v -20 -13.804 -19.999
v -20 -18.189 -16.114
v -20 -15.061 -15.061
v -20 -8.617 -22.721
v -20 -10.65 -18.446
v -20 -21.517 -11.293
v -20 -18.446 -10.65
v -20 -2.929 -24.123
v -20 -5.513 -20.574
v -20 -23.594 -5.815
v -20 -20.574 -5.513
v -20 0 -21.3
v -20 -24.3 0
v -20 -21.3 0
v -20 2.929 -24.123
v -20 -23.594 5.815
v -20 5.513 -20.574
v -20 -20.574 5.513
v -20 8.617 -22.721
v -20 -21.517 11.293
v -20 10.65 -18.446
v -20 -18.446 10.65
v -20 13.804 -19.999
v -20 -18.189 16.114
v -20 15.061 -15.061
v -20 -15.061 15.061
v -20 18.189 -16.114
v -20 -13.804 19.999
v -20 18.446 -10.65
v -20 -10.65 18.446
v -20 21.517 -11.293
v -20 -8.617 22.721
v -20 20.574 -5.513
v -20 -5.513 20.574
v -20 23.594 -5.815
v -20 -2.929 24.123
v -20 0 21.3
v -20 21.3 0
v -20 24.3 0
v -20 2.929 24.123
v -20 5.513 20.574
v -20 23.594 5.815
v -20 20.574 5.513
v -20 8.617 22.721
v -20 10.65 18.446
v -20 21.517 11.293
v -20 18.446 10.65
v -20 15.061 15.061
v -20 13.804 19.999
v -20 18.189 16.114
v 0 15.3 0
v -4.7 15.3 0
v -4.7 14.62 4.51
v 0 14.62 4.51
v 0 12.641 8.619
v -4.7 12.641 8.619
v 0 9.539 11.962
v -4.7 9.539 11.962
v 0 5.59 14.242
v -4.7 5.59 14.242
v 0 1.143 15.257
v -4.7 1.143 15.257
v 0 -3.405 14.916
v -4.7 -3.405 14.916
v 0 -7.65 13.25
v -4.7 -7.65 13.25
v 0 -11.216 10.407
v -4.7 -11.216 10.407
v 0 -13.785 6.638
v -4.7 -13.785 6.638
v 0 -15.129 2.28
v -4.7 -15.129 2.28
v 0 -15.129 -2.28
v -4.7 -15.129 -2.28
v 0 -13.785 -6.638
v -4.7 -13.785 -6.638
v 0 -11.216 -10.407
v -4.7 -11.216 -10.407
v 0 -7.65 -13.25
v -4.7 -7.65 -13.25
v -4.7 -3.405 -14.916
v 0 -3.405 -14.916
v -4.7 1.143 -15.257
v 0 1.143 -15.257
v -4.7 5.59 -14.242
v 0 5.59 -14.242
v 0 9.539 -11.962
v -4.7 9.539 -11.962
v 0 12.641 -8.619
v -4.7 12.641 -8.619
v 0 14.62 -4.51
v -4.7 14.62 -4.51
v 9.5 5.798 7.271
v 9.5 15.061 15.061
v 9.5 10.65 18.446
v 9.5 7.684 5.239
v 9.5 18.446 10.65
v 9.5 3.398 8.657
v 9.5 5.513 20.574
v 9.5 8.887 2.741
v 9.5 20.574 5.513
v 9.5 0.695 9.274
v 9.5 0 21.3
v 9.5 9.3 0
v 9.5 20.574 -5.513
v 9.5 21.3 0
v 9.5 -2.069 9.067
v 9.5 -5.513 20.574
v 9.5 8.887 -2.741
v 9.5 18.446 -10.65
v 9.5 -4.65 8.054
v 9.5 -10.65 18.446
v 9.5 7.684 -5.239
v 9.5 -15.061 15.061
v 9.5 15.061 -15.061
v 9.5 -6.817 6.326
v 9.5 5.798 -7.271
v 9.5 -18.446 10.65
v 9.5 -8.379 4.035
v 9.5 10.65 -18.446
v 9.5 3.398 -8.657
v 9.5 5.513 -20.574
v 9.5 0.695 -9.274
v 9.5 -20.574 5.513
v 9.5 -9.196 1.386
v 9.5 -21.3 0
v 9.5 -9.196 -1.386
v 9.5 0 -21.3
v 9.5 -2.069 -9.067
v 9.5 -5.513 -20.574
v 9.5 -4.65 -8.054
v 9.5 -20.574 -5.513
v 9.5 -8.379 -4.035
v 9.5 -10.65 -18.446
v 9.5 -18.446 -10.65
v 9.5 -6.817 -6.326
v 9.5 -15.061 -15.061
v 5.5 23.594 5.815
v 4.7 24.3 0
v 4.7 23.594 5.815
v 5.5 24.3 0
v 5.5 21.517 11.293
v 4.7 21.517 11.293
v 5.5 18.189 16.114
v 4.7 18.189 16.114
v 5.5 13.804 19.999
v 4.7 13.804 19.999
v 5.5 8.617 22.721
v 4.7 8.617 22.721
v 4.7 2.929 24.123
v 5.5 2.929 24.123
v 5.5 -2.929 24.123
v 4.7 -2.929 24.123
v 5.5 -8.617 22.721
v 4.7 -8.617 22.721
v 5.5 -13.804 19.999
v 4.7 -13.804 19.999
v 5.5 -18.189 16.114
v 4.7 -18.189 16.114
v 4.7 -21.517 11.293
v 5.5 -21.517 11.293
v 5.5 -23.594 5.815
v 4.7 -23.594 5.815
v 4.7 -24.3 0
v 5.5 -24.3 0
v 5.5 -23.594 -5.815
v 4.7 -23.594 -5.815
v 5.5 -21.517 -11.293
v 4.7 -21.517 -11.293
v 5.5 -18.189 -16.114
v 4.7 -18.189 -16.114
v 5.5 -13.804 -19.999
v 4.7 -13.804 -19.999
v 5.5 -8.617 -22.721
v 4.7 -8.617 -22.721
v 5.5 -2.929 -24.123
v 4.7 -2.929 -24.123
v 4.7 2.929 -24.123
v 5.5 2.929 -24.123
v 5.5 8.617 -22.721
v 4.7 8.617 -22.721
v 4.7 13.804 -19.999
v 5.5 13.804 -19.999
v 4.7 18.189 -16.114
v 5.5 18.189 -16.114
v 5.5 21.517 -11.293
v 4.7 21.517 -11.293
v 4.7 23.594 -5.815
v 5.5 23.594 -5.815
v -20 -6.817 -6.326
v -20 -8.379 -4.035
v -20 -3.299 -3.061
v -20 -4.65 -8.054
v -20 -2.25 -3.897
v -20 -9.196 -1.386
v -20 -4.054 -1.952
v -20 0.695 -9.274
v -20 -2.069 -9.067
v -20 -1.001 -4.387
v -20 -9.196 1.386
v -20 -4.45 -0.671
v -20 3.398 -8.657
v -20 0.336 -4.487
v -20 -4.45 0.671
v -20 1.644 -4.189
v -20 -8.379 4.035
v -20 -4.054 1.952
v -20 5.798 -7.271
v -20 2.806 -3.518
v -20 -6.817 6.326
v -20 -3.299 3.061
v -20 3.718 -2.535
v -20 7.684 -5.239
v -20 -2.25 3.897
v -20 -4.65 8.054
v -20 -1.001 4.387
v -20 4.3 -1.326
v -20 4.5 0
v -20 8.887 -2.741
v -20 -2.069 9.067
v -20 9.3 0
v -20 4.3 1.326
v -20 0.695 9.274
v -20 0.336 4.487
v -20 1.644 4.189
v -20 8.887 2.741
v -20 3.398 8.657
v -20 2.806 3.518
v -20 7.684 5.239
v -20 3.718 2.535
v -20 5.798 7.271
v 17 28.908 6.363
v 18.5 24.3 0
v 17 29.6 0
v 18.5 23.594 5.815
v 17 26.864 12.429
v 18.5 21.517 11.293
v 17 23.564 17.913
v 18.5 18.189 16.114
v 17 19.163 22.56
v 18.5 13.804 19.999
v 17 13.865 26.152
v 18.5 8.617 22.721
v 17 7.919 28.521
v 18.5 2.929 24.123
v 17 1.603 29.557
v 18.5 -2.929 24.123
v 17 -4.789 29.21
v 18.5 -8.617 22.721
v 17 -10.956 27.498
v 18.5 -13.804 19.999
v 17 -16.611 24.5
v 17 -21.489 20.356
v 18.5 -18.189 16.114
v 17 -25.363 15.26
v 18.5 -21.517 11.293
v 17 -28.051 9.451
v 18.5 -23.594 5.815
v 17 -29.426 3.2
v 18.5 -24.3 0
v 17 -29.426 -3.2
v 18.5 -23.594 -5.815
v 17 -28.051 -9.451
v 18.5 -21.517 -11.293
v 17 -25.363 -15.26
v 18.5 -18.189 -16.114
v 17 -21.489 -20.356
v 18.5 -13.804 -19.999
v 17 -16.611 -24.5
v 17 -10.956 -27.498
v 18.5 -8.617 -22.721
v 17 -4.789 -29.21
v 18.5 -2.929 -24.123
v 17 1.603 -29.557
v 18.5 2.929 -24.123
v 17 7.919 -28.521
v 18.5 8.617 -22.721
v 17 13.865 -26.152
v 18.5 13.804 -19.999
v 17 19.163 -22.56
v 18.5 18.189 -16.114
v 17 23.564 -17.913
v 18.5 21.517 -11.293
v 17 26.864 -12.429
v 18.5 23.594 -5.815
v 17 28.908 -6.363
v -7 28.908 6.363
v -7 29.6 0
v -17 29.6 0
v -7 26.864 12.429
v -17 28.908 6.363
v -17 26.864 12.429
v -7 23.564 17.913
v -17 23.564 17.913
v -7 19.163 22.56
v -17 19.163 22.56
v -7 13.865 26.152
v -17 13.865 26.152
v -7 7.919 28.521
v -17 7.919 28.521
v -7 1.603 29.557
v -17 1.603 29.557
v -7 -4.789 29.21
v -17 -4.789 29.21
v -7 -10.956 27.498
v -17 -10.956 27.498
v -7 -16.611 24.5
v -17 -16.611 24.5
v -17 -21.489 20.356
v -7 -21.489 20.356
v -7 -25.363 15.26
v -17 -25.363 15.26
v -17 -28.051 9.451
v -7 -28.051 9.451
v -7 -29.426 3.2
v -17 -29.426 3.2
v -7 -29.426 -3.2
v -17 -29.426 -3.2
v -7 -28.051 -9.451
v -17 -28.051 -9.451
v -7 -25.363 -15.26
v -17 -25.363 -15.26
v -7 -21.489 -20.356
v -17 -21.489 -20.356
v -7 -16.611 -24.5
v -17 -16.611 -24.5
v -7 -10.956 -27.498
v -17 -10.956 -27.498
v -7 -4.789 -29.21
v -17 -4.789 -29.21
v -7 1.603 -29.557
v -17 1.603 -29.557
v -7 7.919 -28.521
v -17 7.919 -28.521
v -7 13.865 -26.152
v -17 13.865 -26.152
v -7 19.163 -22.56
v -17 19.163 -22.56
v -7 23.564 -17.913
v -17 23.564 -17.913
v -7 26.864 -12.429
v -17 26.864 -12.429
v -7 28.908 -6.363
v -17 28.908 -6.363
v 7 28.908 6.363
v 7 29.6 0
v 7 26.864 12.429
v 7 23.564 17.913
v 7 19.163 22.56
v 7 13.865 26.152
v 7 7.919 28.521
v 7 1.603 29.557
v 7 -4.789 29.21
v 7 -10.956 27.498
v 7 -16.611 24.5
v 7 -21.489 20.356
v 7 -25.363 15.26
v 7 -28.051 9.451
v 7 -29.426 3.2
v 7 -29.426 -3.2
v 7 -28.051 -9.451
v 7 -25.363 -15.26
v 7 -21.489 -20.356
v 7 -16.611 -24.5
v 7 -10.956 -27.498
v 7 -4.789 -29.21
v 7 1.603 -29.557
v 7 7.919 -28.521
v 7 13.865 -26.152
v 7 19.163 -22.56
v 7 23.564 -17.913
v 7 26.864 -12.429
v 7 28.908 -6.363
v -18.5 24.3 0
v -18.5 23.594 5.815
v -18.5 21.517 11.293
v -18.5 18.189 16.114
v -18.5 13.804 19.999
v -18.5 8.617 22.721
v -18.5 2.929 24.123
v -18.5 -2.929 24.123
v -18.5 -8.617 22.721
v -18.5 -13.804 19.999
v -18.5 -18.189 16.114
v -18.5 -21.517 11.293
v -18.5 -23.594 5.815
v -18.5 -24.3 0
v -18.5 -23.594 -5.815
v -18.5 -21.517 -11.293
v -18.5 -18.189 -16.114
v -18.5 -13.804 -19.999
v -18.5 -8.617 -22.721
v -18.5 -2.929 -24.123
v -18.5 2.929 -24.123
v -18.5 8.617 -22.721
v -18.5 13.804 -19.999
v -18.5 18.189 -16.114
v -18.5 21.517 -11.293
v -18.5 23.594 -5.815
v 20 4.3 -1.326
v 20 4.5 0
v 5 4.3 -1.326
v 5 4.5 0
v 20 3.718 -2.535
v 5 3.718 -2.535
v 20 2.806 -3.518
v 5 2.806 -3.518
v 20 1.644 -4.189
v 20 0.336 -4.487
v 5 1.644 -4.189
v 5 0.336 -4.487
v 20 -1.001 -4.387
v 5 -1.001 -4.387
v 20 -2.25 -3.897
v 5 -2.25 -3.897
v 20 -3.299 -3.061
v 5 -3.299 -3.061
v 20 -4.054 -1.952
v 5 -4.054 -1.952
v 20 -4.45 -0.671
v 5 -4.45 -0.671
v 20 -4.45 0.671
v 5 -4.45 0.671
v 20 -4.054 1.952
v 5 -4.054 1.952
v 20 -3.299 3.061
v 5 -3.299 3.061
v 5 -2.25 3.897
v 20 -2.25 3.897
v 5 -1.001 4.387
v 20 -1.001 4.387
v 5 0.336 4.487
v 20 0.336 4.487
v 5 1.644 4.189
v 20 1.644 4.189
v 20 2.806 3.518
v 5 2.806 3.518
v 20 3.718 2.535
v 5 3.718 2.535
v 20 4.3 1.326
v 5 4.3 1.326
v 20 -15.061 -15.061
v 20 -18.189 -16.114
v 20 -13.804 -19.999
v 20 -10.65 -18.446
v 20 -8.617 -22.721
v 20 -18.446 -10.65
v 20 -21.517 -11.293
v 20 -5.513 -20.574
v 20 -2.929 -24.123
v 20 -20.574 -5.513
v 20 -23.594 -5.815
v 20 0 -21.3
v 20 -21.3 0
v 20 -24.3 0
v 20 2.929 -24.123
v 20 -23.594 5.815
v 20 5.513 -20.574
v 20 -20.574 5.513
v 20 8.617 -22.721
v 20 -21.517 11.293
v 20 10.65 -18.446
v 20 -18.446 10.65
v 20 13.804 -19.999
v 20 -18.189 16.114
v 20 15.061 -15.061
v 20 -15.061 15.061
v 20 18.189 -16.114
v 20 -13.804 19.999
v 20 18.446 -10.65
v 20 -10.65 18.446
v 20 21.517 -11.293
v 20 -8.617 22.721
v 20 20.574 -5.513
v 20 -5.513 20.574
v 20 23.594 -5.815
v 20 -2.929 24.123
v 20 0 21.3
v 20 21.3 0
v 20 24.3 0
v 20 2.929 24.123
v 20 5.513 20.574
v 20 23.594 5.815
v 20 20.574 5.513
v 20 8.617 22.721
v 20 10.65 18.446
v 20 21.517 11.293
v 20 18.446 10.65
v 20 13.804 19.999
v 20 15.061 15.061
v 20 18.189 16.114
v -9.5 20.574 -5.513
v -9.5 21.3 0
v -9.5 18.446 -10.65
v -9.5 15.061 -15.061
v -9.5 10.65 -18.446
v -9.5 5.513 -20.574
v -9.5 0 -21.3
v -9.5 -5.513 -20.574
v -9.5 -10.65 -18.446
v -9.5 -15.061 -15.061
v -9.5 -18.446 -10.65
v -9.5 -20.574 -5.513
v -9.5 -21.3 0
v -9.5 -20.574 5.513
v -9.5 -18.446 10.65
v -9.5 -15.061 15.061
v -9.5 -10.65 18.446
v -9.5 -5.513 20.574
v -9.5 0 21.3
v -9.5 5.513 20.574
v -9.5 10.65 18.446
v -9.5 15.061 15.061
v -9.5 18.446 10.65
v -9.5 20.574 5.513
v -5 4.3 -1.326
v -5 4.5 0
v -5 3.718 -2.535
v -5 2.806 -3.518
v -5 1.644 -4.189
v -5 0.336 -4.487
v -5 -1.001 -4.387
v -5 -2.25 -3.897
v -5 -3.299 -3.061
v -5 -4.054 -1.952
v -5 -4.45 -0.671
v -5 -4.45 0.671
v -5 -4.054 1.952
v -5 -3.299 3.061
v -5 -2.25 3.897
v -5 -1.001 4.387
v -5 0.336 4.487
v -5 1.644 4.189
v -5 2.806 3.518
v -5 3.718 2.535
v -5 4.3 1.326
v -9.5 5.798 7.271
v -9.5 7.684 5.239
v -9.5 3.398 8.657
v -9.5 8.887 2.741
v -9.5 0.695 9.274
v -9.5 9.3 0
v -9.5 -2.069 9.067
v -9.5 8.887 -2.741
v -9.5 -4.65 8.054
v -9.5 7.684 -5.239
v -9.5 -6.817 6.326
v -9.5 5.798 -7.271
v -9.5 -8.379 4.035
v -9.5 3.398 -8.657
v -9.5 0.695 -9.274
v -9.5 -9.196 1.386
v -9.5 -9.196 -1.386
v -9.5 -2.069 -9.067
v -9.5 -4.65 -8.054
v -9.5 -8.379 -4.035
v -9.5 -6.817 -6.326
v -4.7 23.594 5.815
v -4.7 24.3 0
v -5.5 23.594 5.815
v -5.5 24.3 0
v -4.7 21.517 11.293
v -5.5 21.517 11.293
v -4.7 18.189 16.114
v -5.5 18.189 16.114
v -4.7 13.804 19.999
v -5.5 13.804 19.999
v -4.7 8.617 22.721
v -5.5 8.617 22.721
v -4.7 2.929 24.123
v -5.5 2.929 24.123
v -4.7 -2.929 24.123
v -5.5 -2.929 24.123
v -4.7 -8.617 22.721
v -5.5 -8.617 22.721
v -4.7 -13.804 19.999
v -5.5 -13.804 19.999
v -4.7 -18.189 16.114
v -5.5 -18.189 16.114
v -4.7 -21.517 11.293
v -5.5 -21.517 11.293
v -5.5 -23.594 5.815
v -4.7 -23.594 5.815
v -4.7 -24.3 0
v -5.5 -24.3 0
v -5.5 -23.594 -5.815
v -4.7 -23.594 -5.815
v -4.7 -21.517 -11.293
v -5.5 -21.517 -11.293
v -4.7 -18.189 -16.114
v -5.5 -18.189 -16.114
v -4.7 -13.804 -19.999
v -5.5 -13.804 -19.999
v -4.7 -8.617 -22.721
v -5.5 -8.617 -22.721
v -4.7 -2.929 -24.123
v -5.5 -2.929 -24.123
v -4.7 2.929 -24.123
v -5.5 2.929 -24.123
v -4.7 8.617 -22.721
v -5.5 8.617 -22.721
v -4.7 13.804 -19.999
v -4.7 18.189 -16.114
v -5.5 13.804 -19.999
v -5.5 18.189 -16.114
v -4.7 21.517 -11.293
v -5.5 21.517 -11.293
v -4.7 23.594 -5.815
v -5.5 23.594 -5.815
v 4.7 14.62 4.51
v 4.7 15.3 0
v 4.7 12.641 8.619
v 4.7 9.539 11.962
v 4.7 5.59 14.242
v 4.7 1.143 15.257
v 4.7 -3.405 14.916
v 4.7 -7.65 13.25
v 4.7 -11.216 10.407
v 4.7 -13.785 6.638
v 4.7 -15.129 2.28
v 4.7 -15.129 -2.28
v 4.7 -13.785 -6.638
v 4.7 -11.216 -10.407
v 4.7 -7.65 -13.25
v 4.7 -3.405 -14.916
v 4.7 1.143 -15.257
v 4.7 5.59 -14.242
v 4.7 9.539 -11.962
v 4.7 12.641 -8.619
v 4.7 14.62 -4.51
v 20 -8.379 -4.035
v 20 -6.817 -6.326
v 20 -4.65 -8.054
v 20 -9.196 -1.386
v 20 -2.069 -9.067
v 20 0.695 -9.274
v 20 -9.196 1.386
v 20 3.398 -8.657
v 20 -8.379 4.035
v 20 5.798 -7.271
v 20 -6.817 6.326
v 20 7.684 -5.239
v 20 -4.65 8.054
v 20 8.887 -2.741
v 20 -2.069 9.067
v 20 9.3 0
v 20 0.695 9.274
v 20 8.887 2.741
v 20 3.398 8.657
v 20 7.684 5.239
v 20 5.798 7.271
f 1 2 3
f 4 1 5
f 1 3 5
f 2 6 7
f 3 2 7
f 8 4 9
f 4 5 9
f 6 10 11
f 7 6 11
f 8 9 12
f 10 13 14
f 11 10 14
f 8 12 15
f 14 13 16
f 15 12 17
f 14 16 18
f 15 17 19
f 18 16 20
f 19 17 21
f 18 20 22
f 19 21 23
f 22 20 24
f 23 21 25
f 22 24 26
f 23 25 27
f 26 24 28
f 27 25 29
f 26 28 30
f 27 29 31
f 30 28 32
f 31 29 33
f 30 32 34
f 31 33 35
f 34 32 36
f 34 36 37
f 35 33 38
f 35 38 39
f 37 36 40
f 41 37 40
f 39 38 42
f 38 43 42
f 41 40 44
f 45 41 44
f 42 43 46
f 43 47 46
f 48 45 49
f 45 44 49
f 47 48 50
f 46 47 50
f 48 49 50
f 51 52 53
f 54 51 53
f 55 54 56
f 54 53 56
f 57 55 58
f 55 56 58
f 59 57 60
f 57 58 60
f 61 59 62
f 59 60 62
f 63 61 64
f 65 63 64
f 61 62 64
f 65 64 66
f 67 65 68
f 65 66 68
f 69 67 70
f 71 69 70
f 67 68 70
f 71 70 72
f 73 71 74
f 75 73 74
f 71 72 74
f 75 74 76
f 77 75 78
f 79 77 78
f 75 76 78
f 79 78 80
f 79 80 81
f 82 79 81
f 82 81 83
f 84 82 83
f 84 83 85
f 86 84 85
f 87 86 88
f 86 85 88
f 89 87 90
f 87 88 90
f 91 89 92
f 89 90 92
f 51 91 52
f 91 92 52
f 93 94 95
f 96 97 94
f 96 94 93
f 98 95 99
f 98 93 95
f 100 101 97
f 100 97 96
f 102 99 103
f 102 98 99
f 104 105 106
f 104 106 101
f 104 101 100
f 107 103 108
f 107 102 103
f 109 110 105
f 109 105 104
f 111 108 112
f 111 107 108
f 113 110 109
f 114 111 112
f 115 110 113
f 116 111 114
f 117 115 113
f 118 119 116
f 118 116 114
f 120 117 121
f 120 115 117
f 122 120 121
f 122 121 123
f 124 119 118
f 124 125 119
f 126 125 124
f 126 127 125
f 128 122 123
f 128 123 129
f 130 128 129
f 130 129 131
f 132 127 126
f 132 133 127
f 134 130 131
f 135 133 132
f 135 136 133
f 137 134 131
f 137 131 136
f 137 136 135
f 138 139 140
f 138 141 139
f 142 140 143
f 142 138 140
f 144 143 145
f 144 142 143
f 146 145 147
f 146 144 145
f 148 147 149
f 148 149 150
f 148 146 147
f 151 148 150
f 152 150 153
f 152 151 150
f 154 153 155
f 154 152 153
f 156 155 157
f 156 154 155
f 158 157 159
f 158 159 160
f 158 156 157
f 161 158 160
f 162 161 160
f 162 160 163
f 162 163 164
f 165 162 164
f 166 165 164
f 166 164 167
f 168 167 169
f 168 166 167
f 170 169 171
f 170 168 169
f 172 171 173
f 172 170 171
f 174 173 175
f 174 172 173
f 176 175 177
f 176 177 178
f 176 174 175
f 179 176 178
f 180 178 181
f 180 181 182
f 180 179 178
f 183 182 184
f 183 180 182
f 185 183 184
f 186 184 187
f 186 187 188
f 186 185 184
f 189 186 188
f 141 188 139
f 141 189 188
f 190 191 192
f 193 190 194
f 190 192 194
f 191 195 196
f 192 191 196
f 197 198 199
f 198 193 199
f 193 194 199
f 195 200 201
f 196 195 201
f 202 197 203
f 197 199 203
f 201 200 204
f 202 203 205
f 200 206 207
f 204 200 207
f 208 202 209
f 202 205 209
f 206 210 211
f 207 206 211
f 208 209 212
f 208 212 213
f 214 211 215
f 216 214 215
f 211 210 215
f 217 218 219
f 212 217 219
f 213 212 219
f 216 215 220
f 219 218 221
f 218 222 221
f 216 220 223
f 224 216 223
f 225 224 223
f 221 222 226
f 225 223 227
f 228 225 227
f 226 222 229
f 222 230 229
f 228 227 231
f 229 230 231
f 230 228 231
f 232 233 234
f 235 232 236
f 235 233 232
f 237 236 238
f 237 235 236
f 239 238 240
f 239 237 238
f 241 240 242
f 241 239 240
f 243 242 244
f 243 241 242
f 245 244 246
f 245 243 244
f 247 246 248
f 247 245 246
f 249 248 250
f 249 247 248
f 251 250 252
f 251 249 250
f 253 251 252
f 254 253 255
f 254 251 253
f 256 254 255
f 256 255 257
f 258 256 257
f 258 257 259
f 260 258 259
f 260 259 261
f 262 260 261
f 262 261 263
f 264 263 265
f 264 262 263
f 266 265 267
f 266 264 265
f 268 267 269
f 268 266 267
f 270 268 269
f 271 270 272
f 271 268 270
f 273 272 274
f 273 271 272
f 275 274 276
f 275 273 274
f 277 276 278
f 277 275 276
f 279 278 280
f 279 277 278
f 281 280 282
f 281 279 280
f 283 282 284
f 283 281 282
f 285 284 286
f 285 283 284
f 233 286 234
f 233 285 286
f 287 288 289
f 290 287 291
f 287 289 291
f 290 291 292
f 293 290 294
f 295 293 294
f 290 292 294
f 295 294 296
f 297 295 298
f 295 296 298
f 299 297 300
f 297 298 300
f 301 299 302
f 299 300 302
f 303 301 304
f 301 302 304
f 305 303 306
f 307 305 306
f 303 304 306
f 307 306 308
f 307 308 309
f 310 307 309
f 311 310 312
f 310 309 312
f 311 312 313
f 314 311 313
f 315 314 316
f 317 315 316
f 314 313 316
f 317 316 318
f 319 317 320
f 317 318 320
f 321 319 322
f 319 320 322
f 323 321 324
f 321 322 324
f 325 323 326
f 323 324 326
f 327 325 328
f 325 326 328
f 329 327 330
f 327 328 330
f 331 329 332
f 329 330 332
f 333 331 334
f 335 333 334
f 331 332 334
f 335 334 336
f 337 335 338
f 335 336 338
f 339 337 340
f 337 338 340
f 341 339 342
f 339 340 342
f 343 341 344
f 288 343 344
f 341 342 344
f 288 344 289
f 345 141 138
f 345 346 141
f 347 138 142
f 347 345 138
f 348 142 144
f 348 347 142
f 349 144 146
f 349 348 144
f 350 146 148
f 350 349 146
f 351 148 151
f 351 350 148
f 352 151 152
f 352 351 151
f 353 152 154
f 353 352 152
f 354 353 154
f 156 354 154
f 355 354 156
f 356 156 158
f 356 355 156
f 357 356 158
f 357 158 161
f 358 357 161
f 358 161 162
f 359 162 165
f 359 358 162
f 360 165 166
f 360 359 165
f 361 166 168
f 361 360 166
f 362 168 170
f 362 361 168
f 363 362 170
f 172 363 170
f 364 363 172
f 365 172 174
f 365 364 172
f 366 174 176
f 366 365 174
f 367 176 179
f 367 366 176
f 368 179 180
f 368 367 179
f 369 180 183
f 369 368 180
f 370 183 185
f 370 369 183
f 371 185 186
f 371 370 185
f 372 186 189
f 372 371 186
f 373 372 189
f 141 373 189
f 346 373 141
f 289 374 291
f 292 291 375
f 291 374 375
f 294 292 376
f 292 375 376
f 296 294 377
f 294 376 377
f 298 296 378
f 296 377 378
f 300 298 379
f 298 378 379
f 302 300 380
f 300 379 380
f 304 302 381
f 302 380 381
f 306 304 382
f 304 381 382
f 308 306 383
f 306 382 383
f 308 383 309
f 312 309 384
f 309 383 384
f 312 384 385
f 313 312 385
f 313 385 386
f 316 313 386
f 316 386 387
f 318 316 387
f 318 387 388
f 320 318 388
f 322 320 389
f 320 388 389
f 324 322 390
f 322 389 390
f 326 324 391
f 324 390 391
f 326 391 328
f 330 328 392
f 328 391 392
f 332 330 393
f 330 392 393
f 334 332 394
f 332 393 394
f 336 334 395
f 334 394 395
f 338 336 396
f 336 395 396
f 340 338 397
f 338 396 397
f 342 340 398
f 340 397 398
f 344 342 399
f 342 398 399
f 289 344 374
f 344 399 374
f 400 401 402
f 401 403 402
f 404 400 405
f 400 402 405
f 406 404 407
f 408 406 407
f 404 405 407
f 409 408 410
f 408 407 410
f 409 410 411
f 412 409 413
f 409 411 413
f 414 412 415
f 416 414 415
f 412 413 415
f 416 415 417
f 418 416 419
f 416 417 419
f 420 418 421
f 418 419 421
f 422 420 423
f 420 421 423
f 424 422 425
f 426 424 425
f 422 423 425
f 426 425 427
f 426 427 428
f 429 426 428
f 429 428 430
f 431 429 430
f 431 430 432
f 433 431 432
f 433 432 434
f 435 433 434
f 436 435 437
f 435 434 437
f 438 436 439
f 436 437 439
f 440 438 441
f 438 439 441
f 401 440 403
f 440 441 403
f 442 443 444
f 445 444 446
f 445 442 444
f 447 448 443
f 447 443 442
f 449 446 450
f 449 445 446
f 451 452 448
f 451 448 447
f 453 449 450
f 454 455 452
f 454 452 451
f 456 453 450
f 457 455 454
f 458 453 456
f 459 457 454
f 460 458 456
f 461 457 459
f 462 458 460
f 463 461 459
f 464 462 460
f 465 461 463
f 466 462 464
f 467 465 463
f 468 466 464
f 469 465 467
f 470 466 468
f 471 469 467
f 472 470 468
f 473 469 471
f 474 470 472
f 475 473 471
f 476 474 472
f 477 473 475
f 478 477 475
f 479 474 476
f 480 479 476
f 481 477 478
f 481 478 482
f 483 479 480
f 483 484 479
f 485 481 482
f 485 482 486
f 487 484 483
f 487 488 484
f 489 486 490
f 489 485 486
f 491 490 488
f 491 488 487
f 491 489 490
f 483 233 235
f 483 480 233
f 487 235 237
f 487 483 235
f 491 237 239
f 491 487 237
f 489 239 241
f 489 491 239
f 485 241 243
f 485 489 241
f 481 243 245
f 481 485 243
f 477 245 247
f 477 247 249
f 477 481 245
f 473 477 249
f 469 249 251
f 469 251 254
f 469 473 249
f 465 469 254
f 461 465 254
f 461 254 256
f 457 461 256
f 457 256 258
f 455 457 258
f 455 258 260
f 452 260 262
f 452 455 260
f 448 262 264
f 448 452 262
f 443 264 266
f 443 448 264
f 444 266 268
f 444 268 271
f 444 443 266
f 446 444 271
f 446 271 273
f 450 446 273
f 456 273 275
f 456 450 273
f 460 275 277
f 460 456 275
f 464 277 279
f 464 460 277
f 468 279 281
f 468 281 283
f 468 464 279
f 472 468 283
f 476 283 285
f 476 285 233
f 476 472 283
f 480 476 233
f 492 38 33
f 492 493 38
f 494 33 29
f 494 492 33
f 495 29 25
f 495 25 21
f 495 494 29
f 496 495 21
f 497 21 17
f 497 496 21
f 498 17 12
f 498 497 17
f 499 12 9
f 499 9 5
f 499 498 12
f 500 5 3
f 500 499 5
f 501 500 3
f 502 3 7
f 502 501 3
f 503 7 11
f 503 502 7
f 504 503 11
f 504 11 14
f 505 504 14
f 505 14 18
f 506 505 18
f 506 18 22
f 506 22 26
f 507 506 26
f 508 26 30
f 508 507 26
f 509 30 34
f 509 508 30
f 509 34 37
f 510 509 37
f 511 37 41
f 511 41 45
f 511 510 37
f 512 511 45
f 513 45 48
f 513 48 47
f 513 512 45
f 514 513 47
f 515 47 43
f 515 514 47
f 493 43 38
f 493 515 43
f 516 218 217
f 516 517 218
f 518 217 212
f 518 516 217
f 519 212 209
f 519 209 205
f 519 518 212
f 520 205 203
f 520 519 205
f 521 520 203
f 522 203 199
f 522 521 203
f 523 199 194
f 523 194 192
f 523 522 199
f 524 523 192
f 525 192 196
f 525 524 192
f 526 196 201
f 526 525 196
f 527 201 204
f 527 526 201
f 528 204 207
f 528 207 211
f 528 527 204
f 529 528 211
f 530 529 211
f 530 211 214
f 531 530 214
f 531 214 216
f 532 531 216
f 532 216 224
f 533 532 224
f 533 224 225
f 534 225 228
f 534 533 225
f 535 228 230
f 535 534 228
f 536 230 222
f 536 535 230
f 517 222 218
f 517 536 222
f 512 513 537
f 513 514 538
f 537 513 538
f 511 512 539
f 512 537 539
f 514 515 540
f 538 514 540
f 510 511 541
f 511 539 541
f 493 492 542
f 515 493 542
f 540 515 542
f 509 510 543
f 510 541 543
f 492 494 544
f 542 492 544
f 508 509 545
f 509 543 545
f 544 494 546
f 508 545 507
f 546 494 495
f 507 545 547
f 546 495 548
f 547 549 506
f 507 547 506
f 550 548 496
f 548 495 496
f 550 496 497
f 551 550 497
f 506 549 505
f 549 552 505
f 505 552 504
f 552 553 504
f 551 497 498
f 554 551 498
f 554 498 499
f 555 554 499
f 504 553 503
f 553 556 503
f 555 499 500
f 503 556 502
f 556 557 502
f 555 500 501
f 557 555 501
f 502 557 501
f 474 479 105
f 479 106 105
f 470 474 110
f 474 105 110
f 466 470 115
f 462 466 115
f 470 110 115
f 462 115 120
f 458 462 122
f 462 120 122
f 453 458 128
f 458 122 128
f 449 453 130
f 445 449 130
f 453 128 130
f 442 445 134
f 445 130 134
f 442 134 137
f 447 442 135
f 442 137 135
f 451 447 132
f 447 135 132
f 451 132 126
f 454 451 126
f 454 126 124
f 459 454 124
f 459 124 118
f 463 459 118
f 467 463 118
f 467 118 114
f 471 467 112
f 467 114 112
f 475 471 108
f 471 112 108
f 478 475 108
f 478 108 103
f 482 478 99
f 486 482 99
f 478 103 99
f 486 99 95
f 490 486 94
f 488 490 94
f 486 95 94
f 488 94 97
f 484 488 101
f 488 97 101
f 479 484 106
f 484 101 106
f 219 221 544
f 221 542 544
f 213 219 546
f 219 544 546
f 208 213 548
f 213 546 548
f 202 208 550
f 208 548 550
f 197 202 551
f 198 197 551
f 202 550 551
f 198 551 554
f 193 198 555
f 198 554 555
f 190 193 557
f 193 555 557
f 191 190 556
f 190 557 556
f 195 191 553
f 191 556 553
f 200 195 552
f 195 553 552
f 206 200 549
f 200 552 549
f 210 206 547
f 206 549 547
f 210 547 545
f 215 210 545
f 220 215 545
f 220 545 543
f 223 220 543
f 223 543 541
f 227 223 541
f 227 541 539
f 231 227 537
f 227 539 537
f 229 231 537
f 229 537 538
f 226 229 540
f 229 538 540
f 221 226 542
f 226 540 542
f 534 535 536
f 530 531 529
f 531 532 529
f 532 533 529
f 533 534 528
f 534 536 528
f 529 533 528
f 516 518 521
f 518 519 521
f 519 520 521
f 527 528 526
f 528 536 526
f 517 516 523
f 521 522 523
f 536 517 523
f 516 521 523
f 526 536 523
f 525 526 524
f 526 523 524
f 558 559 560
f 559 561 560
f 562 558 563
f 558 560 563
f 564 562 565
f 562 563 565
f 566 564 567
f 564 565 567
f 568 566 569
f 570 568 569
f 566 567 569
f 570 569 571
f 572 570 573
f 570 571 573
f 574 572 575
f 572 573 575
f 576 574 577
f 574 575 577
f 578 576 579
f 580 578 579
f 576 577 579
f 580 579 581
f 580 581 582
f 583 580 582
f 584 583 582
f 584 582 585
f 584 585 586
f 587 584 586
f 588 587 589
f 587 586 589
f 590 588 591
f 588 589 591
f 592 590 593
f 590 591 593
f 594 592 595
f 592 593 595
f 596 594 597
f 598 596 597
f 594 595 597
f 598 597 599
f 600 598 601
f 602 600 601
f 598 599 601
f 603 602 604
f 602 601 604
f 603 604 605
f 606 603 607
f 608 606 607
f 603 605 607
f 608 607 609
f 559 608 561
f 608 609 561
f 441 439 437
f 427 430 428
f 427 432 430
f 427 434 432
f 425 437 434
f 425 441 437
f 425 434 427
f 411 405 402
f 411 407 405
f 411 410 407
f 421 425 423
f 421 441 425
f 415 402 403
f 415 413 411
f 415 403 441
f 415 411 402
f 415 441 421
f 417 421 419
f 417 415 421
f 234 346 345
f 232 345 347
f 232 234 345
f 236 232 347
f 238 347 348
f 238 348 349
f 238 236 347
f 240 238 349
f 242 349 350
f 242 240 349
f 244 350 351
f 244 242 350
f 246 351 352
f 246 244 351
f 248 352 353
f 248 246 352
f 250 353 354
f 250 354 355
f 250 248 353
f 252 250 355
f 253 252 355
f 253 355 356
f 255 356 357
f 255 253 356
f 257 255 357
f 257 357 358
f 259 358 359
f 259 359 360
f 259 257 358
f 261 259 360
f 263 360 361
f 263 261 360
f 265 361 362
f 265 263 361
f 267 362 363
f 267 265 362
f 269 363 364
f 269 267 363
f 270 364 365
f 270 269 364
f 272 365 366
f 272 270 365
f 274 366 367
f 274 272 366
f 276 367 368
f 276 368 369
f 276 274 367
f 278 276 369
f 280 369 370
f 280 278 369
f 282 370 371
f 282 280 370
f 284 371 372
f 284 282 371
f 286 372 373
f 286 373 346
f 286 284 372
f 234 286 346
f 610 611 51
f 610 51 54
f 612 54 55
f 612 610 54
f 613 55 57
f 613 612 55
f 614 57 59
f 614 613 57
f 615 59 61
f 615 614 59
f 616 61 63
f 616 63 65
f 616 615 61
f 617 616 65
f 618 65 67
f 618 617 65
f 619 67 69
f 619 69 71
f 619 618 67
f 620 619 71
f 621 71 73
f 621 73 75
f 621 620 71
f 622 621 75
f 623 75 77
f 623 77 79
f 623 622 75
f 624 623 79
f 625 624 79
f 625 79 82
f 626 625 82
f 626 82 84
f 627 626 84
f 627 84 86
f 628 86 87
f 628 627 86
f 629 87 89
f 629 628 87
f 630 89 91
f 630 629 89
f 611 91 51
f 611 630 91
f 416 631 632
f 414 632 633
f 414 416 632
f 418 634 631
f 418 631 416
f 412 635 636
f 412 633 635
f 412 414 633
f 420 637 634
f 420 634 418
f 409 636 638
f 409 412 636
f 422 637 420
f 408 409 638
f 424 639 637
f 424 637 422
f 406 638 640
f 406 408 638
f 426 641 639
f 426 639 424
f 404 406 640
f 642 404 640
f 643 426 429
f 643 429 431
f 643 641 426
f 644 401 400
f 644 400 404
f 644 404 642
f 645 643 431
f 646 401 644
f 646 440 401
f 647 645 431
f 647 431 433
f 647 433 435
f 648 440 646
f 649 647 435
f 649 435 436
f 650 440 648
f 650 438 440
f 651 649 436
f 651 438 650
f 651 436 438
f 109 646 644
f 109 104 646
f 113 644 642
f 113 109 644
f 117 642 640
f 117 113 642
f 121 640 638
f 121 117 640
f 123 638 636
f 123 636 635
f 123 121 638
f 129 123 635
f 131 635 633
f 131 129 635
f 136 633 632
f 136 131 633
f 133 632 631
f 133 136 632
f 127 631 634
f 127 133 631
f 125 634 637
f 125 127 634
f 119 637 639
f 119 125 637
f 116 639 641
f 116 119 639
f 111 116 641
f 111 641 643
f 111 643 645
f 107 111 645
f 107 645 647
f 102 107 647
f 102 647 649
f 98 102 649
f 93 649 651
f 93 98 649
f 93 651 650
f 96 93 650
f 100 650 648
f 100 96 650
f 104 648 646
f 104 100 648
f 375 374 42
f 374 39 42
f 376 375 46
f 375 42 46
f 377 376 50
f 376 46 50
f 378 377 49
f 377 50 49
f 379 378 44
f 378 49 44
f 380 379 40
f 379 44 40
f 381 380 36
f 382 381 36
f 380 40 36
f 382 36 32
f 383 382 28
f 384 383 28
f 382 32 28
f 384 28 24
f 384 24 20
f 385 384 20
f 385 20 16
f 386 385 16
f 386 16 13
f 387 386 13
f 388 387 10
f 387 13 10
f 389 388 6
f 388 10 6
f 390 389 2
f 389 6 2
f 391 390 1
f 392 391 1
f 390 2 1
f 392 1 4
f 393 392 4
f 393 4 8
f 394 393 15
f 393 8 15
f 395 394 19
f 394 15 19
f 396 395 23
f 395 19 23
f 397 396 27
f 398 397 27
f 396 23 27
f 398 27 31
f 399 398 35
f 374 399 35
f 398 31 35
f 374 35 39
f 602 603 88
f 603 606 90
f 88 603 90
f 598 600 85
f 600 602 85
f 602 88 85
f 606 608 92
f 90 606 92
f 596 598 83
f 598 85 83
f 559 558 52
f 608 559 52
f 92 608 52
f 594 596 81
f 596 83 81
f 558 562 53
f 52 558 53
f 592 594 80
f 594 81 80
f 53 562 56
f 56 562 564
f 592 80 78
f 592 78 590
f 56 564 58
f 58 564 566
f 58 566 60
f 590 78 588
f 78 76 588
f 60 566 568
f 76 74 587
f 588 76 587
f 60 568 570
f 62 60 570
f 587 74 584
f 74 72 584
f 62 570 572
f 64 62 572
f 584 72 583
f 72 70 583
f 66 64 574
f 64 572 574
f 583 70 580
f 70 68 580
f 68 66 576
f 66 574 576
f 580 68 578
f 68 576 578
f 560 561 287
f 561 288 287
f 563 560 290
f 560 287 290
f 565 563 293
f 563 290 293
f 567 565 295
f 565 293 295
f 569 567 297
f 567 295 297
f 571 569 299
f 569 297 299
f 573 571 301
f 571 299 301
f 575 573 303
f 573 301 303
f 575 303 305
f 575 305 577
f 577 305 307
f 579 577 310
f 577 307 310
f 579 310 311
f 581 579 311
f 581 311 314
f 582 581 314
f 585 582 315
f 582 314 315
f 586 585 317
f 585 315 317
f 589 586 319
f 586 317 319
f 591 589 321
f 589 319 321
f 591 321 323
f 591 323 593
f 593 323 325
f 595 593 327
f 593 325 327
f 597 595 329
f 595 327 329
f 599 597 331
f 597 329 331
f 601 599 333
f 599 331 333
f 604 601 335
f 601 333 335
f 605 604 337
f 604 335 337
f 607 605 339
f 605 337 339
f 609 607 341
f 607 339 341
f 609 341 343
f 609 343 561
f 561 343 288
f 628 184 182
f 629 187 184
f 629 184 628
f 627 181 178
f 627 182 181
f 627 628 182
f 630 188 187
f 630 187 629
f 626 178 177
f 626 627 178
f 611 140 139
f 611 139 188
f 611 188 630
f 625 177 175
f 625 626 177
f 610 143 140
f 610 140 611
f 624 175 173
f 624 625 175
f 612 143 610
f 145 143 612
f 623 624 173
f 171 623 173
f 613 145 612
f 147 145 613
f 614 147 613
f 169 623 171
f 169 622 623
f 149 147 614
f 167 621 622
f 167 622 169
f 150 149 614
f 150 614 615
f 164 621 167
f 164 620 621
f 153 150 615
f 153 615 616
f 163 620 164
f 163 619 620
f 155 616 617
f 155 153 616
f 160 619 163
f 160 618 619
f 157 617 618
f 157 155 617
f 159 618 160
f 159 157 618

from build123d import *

# Parameters (mm, degrees)
SKETCH2_W   = 10.5
SKETCH2_H   = 12
SKETCH2_W_2 = 15
SKETCH2_H_2 = 4.5


with BuildPart() as part:
    # Sketch1 → Revolve1 (revolve)
    with BuildSketch(Plane.XY):
        Polygon((0, 0), (0, 15.3), (-4.7, 15.3), (-4.7, 24.3), (-5.5, 24.3), (-7, 29.6), (-17, 29.6), (-18.5, 24.3), (-20, 24.3), (-20, 0), align=None)
    revolve1 = revolve(axis=Axis((-20, 0, 0), (1, 0, 0)))

    # Sketch2 → Cut-Revolve1 (revolve, cut)
    with BuildSketch(Plane.XY):
        with Locations((-14.75, 15.3)):
            Rectangle(SKETCH2_W, SKETCH2_H)
        with Locations((-12.5, 2.25)):
            Rectangle(SKETCH2_W_2, SKETCH2_H_2)
    cut_revolve1 = revolve(axis=Axis((0, 0, 0), (-1, 0, 0)), mode=Mode.SUBTRACT)

    # Mirror1: Revolve1, Cut-Revolve1 across plane
    add(revolve1.mirror(Plane.ZY))
    add(cut_revolve1.mirror(Plane.ZY), mode=Mode.SUBTRACT)


solid = part.part
